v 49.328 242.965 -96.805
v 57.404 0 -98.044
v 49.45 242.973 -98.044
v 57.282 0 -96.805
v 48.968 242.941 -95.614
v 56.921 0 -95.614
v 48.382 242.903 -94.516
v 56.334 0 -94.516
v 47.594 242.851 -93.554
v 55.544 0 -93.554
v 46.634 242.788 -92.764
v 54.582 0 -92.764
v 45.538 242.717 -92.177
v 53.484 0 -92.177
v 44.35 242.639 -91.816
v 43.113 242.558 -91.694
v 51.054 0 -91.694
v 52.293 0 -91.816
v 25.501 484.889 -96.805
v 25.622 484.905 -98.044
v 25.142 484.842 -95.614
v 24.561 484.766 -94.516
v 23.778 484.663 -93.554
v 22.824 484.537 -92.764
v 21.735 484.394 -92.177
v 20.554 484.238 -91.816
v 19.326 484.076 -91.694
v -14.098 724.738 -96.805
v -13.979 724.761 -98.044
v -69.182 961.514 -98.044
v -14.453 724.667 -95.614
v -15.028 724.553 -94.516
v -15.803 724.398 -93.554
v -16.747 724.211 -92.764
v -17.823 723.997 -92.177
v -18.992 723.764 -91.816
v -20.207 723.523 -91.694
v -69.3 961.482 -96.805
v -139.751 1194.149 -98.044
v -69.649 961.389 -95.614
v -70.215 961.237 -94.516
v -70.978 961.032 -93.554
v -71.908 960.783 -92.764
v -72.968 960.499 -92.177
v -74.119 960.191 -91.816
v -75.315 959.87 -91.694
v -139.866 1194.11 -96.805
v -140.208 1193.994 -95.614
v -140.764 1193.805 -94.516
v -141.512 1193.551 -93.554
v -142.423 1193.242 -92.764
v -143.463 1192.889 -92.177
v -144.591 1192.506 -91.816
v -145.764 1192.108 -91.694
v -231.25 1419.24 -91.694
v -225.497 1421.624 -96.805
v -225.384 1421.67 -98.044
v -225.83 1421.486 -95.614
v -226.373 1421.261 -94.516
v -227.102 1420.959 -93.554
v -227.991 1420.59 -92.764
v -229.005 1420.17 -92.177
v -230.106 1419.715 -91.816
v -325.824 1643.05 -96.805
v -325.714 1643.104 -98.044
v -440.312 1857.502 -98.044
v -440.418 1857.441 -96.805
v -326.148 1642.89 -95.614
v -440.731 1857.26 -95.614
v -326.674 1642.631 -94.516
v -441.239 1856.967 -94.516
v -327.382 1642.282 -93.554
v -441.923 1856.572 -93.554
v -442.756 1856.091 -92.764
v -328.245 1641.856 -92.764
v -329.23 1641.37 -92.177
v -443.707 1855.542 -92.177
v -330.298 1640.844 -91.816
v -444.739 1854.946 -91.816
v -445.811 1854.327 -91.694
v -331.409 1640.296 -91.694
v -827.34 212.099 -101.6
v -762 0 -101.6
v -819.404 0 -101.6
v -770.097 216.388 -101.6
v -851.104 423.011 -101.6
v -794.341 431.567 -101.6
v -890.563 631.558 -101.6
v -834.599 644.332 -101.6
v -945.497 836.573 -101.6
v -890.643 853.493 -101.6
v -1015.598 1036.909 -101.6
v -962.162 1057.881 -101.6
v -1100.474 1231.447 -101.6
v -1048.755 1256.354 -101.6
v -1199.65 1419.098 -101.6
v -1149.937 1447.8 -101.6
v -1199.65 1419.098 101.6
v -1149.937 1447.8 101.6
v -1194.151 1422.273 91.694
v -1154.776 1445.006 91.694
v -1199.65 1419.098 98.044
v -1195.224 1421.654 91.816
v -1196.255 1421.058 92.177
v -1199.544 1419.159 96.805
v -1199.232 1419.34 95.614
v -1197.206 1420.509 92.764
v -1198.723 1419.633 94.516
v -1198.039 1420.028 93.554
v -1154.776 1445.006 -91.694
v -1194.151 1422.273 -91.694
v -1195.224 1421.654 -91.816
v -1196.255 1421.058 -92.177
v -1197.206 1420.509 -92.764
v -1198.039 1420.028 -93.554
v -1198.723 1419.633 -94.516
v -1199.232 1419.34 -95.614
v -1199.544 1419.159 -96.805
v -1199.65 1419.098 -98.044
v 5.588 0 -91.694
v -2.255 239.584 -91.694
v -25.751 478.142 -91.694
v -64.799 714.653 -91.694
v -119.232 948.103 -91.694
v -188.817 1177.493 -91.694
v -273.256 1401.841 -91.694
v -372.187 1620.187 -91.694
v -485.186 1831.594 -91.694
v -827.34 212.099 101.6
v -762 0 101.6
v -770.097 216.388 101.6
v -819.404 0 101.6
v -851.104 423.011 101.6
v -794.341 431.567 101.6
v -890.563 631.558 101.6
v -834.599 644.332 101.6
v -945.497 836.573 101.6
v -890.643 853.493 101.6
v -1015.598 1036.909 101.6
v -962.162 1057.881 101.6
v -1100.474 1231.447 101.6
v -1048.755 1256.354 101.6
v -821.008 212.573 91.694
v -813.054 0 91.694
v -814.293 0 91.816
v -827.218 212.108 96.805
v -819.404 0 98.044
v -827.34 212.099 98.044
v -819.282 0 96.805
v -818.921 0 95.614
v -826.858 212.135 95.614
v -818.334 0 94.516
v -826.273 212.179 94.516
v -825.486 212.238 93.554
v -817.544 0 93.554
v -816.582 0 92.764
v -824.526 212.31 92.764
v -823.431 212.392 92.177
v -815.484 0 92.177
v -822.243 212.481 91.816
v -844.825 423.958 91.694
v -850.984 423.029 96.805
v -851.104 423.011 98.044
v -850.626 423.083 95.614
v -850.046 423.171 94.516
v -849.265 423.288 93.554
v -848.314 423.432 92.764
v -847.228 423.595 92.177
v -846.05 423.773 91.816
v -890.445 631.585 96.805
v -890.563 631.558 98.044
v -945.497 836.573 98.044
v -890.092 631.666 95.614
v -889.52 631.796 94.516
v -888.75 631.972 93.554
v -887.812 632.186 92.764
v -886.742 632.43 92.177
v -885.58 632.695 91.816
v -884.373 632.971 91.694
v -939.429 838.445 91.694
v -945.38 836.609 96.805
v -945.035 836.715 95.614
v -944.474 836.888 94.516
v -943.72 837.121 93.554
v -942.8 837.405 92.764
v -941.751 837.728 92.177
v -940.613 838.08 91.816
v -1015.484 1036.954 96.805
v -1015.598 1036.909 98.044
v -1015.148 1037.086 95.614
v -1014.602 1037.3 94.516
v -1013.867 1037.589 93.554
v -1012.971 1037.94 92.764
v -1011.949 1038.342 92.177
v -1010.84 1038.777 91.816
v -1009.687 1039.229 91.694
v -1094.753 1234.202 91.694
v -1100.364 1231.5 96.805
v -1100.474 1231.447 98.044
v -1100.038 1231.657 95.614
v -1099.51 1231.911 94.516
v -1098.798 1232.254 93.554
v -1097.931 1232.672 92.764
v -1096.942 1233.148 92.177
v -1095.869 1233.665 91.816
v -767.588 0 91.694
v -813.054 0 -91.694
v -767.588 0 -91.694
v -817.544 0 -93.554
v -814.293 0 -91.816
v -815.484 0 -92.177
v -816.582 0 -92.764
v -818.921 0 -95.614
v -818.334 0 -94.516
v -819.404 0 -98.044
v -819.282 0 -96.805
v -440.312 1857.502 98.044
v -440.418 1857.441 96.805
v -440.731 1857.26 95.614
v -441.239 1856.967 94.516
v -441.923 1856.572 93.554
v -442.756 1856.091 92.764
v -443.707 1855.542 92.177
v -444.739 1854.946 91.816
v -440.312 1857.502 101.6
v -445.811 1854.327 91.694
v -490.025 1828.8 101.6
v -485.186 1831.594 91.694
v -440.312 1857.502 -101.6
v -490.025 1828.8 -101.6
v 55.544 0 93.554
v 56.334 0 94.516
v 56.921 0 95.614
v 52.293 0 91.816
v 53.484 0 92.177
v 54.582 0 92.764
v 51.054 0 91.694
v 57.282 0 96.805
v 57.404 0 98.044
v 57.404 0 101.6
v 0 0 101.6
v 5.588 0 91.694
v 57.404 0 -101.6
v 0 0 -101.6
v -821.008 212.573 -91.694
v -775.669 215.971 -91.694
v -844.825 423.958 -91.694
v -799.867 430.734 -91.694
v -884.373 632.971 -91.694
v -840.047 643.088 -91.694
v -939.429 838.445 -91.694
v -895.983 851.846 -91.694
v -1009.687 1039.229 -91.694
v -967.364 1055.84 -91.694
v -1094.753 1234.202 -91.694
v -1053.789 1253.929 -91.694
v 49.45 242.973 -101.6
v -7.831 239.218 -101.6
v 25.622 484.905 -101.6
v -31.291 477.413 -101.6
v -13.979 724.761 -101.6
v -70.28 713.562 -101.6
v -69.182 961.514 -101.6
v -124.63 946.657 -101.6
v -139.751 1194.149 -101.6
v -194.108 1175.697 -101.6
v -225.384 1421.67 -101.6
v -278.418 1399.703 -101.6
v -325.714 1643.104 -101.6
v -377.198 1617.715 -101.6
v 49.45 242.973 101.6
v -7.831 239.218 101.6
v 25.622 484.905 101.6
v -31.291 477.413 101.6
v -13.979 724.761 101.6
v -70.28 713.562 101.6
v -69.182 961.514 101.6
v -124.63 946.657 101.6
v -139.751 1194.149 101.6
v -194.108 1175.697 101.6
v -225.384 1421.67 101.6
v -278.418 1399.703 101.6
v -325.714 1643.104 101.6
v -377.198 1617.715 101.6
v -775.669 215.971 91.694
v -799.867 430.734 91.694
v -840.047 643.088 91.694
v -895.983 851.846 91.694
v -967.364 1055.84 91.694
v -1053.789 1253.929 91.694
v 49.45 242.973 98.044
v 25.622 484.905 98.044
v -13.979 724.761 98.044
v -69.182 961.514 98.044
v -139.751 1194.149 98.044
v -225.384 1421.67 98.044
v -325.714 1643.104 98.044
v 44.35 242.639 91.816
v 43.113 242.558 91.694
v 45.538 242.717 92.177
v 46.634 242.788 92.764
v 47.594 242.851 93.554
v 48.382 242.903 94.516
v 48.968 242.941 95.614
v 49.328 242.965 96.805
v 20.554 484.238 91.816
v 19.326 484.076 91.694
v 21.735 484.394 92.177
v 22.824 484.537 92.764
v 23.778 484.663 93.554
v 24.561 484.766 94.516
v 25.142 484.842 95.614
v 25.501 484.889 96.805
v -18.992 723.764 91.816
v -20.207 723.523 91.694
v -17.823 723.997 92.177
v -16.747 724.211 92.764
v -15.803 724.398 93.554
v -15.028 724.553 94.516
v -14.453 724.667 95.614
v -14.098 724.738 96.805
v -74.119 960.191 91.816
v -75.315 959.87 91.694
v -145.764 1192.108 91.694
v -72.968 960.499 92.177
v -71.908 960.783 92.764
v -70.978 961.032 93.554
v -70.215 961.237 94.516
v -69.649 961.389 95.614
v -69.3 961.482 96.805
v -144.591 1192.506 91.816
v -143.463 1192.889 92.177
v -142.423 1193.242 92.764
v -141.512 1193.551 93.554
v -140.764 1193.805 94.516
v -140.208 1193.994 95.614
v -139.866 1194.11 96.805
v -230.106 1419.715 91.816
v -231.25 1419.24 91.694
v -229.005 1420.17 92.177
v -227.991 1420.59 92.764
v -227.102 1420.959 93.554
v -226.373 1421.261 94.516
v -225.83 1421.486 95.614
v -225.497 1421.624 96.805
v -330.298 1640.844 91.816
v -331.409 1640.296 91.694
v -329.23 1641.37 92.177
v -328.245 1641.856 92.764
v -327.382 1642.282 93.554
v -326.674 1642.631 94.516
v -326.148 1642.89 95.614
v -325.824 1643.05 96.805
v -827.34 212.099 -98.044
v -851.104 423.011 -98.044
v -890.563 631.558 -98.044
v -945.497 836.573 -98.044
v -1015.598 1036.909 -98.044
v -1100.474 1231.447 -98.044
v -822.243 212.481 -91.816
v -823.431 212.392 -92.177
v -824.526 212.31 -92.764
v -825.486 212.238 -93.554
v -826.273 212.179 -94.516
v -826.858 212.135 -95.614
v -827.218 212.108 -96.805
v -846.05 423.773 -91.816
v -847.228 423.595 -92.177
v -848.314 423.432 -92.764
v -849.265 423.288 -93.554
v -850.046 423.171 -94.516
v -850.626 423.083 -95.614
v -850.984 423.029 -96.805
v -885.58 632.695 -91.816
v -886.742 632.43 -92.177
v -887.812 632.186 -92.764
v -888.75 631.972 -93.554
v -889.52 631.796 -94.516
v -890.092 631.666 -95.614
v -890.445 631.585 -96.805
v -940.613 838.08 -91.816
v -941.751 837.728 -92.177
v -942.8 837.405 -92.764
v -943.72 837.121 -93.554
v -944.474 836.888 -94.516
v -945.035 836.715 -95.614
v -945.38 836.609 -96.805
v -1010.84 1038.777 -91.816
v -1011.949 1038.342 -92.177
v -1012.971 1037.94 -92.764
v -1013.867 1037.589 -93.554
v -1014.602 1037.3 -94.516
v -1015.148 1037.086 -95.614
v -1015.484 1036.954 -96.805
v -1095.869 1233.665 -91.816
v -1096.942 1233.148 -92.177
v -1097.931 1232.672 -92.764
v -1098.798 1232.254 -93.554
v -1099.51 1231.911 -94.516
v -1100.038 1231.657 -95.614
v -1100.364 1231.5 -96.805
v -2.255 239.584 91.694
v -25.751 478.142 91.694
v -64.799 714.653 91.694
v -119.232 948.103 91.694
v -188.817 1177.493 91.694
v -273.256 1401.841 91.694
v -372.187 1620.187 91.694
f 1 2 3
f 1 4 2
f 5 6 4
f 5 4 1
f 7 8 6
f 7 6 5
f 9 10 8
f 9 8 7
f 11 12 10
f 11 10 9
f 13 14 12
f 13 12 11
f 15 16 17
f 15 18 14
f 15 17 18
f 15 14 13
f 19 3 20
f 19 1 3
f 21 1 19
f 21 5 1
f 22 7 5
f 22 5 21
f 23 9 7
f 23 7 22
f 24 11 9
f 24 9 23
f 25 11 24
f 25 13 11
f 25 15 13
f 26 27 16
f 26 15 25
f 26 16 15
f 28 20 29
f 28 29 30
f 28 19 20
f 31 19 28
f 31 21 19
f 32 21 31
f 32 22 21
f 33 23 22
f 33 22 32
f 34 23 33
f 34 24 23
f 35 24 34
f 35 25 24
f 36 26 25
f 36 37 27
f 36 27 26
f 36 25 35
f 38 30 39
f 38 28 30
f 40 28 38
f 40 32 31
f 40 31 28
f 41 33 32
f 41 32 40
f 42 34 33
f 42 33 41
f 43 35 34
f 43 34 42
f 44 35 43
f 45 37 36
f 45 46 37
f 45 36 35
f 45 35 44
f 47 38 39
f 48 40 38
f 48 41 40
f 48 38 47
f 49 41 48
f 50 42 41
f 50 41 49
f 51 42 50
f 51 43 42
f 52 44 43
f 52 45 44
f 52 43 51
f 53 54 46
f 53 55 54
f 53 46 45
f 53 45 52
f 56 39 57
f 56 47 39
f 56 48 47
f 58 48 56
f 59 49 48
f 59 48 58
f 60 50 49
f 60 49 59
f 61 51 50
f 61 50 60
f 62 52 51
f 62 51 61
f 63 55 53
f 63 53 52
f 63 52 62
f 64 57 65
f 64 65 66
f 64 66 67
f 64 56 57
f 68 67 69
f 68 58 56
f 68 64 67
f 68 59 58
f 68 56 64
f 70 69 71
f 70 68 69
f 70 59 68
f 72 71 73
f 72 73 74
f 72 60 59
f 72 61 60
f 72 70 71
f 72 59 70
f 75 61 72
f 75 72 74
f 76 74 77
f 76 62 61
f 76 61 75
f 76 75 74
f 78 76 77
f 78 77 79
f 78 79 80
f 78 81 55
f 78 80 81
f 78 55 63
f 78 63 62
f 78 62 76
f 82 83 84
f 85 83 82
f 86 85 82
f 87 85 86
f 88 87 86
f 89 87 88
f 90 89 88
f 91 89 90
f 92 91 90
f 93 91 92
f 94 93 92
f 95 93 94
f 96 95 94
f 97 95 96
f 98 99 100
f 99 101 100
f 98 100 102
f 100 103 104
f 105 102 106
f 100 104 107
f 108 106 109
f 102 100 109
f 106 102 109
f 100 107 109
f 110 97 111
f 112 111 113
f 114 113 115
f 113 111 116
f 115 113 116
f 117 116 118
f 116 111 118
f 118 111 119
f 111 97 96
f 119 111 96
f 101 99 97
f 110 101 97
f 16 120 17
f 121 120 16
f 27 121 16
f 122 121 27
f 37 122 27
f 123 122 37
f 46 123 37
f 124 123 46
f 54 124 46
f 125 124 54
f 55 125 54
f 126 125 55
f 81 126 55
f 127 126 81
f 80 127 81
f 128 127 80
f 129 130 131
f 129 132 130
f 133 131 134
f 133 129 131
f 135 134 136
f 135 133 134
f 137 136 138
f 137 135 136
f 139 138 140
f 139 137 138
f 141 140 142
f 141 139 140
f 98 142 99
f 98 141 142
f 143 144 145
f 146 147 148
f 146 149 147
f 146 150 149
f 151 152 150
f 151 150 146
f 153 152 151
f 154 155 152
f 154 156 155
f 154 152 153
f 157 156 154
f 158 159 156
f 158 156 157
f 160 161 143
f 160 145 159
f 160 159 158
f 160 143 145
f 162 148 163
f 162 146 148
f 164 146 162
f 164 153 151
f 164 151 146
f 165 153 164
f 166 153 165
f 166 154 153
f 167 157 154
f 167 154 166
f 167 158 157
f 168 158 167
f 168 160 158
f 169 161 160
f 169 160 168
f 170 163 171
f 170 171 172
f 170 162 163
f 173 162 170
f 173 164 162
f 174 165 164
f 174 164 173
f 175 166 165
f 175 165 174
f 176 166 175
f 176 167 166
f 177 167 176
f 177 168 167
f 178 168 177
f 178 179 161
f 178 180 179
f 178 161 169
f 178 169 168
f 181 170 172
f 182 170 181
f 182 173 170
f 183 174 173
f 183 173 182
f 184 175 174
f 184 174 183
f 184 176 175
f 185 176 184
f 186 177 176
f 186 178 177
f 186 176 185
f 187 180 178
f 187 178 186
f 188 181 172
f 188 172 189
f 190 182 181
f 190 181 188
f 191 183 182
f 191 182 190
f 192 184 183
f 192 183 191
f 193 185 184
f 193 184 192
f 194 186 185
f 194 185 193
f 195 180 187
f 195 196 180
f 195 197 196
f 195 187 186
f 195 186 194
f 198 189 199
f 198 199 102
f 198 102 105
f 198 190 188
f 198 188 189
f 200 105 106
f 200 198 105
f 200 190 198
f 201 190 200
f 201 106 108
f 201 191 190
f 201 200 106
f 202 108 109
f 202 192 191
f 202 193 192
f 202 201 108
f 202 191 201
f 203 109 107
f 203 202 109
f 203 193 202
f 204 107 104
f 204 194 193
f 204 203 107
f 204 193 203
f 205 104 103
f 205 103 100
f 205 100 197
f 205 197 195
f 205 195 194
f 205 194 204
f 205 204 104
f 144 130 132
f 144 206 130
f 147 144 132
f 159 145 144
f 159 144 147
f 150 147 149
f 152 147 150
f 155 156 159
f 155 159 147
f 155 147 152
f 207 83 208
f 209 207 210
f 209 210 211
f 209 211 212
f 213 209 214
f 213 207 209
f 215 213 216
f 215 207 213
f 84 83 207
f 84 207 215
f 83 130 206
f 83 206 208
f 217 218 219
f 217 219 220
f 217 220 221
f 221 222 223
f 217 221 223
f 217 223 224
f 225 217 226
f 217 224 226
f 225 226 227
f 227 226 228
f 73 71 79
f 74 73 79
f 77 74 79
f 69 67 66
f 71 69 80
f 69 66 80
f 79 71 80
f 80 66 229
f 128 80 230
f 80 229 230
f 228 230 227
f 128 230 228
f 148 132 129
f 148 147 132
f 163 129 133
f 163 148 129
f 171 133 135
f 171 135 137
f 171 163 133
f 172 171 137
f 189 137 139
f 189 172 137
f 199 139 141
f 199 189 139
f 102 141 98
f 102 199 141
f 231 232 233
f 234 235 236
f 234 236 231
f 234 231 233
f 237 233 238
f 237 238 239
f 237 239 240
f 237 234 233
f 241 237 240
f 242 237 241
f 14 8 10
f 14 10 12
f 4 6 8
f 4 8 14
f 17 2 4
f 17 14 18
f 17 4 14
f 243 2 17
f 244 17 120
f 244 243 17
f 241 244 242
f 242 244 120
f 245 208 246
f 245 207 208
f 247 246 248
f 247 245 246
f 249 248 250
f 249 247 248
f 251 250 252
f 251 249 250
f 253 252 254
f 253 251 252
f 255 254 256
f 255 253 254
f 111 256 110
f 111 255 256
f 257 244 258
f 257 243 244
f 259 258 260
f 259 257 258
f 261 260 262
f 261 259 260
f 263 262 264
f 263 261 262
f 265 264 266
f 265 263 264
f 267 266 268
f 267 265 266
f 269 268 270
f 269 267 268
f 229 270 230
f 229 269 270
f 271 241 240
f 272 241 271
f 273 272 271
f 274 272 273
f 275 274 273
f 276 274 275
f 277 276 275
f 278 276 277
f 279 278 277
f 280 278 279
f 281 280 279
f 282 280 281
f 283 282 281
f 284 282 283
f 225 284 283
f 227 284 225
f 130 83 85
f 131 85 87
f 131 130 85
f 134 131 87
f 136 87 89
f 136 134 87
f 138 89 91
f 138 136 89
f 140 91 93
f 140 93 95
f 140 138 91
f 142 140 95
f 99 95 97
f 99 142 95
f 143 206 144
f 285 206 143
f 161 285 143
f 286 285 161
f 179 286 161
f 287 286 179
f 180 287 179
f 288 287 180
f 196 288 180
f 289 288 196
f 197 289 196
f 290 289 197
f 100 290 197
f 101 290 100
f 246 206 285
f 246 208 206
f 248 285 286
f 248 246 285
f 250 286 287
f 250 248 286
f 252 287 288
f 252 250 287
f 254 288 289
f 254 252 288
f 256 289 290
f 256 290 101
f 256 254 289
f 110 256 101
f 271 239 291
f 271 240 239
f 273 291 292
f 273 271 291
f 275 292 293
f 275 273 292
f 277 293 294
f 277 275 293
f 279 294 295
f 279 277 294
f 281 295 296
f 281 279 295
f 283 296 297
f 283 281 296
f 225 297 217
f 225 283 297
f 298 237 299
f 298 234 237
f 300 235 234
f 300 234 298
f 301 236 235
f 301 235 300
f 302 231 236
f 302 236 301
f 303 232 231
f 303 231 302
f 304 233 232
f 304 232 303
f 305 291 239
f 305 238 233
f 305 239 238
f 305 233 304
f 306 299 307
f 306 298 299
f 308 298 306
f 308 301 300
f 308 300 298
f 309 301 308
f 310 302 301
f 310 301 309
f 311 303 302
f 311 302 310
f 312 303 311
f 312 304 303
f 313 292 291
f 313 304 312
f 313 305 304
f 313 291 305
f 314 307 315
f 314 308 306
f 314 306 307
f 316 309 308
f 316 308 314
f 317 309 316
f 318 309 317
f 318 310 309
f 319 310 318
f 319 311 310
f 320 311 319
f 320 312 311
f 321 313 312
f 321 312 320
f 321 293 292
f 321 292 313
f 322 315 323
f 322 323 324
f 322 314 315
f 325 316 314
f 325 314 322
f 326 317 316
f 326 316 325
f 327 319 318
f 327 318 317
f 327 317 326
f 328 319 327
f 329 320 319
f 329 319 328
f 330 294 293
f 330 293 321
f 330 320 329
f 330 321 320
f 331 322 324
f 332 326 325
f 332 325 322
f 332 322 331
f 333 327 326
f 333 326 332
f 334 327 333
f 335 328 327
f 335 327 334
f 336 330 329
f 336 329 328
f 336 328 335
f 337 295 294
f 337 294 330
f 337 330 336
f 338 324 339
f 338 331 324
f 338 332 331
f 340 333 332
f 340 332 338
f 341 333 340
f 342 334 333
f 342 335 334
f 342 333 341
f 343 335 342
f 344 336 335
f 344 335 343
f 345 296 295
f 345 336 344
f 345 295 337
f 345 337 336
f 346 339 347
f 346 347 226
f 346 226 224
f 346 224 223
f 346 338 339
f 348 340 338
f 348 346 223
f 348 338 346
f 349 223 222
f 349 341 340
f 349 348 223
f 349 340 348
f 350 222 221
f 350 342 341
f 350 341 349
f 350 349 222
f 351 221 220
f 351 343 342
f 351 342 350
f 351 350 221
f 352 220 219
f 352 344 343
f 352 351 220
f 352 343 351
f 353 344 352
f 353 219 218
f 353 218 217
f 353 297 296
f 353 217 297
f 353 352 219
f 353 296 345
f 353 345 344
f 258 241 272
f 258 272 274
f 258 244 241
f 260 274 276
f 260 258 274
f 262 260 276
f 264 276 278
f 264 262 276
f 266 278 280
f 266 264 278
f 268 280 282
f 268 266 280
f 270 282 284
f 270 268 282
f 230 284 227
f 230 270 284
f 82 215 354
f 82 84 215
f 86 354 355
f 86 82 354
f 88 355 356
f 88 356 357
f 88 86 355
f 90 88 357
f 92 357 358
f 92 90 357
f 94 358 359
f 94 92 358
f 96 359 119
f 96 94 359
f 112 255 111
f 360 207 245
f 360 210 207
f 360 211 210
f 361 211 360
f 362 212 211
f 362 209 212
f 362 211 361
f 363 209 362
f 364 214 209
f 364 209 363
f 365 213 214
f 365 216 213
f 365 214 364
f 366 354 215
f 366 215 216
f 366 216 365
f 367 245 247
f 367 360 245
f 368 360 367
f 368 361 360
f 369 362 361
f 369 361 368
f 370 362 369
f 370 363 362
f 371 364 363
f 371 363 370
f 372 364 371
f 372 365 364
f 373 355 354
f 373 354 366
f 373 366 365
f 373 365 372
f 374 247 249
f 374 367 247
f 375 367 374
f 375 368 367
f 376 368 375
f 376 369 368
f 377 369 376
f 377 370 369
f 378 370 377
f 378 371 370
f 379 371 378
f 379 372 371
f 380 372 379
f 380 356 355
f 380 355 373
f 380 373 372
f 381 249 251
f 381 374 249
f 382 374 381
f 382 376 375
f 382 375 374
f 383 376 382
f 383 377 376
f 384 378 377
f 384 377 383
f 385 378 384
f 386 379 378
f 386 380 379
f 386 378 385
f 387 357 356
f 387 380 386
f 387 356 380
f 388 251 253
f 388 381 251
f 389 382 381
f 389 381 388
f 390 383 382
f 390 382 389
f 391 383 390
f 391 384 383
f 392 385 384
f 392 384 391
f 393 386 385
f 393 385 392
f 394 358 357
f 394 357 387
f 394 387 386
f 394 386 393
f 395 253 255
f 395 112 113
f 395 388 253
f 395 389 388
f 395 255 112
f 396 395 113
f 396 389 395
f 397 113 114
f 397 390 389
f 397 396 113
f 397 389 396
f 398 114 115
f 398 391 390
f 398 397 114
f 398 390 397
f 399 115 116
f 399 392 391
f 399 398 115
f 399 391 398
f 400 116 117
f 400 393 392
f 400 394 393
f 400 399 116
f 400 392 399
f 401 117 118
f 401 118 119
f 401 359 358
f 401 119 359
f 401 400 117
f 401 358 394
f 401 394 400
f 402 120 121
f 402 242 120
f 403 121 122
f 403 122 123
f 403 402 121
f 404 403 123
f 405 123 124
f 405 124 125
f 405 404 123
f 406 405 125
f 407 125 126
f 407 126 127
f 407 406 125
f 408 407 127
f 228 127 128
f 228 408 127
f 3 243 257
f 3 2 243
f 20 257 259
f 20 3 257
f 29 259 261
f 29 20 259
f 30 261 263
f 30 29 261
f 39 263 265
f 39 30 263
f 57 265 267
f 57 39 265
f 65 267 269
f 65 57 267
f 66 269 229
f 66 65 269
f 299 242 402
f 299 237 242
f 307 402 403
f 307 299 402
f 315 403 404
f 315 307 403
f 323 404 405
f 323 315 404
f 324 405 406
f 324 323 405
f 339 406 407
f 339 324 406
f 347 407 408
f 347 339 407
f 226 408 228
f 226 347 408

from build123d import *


with BuildPart() as f2:
    # F2: sweep along a path in F1
    with BuildLine(Plane.XY) as f2_path:
        ThreePointArc((0, 0), (-124.629698, 946.656539), (-490.025483, 1828.8))
    # F0 (on Front) → F2 (sweep)
    with BuildSketch(Plane.XZ):
        with BuildLine():
            Line((0, 101.6), (0, 0))
            Line((0, 0), (0, -101.6))
            Line((0, -101.6), (57.404, -101.6))
            Line((57.404, -101.6), (57.404, -98.044))
            ThreePointArc((57.404, -98.044), (55.544128, -93.553872), (51.054, -91.694))
            Line((51.054, -91.694), (5.588, -91.694))
            Line((5.588, -91.694), (5.588, 0))
            Line((5.588, 0), (5.588, 91.694))
            Line((5.588, 91.694), (51.054, 91.694))
            ThreePointArc((51.054, 91.694), (55.544128, 93.553872), (57.404, 98.044))
            Line((57.404, 98.044), (57.404, 101.6))
            Line((57.404, 101.6), (0, 101.6))
        make_face()
    sweep(path=f2_path.line)


with BuildPart() as f3:
    # F3: sweep along a path in F1
    with BuildLine(Plane.XY) as f3_path:
        ThreePointArc((-762, 0), (-860.665177, 749.436427), (-1149.936841, 1447.8))
    # F0 (on Front) → F3 (sweep)
    with BuildSketch(Plane.XZ):
        with BuildLine():
            Line((-762, 0), (-762, 101.6))
            Line((-762, 101.6), (-819.404, 101.6))
            Line((-819.404, 101.6), (-819.404, 98.044))
            ThreePointArc((-819.404, 98.044), (-817.544128, 93.553872), (-813.054, 91.694))
            Line((-813.054, 91.694), (-767.588, 91.694))
            Line((-767.588, 91.694), (-767.588, 0))
            Line((-767.588, 0), (-767.588, -91.694))
            Line((-767.588, -91.694), (-813.054, -91.694))
            ThreePointArc((-813.054, -91.694), (-817.544128, -93.553872), (-819.404, -98.044))
            Line((-819.404, -98.044), (-819.404, -101.6))
            Line((-819.404, -101.6), (-762, -101.6))
            Line((-762, -101.6), (-762, 0))
        make_face()
    sweep(path=f3_path.line)


solid = Compound([f2.part, f3.part])
